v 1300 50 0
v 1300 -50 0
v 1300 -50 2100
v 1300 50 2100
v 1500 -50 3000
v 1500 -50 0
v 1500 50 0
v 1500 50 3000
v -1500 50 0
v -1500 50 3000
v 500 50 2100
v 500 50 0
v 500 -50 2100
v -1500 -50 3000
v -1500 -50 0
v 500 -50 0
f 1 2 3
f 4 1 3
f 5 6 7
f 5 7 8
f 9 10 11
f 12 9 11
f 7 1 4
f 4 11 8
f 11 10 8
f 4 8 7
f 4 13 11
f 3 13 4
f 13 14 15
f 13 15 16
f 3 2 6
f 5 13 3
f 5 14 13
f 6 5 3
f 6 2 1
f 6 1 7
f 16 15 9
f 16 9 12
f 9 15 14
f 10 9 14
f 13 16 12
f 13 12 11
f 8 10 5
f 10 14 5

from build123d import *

# Parameters (mm, degrees)
F0_W     = 3000
F0_H     = 3000
F1_DEPTH = 50
F2_W     = 800
F2_H     = 2100
F3_DEPTH = 100.001


with BuildPart() as f1:
    # F0 (on Front) → F1 (new body, symmetric)
    with BuildSketch(Plane.XZ):
        with Locations((0, 1500)):
            Rectangle(F0_W, F0_H)
    extrude(amount=F1_DEPTH, both=True)

    # F2 (on face) → F3 (cut, through all)
    with BuildSketch(Plane.XZ.offset(50)):
        with Locations((900, 1050)):
            Rectangle(F2_W, F2_H)
    extrude(amount=-F3_DEPTH, mode=Mode.SUBTRACT)


solid = f1.part
